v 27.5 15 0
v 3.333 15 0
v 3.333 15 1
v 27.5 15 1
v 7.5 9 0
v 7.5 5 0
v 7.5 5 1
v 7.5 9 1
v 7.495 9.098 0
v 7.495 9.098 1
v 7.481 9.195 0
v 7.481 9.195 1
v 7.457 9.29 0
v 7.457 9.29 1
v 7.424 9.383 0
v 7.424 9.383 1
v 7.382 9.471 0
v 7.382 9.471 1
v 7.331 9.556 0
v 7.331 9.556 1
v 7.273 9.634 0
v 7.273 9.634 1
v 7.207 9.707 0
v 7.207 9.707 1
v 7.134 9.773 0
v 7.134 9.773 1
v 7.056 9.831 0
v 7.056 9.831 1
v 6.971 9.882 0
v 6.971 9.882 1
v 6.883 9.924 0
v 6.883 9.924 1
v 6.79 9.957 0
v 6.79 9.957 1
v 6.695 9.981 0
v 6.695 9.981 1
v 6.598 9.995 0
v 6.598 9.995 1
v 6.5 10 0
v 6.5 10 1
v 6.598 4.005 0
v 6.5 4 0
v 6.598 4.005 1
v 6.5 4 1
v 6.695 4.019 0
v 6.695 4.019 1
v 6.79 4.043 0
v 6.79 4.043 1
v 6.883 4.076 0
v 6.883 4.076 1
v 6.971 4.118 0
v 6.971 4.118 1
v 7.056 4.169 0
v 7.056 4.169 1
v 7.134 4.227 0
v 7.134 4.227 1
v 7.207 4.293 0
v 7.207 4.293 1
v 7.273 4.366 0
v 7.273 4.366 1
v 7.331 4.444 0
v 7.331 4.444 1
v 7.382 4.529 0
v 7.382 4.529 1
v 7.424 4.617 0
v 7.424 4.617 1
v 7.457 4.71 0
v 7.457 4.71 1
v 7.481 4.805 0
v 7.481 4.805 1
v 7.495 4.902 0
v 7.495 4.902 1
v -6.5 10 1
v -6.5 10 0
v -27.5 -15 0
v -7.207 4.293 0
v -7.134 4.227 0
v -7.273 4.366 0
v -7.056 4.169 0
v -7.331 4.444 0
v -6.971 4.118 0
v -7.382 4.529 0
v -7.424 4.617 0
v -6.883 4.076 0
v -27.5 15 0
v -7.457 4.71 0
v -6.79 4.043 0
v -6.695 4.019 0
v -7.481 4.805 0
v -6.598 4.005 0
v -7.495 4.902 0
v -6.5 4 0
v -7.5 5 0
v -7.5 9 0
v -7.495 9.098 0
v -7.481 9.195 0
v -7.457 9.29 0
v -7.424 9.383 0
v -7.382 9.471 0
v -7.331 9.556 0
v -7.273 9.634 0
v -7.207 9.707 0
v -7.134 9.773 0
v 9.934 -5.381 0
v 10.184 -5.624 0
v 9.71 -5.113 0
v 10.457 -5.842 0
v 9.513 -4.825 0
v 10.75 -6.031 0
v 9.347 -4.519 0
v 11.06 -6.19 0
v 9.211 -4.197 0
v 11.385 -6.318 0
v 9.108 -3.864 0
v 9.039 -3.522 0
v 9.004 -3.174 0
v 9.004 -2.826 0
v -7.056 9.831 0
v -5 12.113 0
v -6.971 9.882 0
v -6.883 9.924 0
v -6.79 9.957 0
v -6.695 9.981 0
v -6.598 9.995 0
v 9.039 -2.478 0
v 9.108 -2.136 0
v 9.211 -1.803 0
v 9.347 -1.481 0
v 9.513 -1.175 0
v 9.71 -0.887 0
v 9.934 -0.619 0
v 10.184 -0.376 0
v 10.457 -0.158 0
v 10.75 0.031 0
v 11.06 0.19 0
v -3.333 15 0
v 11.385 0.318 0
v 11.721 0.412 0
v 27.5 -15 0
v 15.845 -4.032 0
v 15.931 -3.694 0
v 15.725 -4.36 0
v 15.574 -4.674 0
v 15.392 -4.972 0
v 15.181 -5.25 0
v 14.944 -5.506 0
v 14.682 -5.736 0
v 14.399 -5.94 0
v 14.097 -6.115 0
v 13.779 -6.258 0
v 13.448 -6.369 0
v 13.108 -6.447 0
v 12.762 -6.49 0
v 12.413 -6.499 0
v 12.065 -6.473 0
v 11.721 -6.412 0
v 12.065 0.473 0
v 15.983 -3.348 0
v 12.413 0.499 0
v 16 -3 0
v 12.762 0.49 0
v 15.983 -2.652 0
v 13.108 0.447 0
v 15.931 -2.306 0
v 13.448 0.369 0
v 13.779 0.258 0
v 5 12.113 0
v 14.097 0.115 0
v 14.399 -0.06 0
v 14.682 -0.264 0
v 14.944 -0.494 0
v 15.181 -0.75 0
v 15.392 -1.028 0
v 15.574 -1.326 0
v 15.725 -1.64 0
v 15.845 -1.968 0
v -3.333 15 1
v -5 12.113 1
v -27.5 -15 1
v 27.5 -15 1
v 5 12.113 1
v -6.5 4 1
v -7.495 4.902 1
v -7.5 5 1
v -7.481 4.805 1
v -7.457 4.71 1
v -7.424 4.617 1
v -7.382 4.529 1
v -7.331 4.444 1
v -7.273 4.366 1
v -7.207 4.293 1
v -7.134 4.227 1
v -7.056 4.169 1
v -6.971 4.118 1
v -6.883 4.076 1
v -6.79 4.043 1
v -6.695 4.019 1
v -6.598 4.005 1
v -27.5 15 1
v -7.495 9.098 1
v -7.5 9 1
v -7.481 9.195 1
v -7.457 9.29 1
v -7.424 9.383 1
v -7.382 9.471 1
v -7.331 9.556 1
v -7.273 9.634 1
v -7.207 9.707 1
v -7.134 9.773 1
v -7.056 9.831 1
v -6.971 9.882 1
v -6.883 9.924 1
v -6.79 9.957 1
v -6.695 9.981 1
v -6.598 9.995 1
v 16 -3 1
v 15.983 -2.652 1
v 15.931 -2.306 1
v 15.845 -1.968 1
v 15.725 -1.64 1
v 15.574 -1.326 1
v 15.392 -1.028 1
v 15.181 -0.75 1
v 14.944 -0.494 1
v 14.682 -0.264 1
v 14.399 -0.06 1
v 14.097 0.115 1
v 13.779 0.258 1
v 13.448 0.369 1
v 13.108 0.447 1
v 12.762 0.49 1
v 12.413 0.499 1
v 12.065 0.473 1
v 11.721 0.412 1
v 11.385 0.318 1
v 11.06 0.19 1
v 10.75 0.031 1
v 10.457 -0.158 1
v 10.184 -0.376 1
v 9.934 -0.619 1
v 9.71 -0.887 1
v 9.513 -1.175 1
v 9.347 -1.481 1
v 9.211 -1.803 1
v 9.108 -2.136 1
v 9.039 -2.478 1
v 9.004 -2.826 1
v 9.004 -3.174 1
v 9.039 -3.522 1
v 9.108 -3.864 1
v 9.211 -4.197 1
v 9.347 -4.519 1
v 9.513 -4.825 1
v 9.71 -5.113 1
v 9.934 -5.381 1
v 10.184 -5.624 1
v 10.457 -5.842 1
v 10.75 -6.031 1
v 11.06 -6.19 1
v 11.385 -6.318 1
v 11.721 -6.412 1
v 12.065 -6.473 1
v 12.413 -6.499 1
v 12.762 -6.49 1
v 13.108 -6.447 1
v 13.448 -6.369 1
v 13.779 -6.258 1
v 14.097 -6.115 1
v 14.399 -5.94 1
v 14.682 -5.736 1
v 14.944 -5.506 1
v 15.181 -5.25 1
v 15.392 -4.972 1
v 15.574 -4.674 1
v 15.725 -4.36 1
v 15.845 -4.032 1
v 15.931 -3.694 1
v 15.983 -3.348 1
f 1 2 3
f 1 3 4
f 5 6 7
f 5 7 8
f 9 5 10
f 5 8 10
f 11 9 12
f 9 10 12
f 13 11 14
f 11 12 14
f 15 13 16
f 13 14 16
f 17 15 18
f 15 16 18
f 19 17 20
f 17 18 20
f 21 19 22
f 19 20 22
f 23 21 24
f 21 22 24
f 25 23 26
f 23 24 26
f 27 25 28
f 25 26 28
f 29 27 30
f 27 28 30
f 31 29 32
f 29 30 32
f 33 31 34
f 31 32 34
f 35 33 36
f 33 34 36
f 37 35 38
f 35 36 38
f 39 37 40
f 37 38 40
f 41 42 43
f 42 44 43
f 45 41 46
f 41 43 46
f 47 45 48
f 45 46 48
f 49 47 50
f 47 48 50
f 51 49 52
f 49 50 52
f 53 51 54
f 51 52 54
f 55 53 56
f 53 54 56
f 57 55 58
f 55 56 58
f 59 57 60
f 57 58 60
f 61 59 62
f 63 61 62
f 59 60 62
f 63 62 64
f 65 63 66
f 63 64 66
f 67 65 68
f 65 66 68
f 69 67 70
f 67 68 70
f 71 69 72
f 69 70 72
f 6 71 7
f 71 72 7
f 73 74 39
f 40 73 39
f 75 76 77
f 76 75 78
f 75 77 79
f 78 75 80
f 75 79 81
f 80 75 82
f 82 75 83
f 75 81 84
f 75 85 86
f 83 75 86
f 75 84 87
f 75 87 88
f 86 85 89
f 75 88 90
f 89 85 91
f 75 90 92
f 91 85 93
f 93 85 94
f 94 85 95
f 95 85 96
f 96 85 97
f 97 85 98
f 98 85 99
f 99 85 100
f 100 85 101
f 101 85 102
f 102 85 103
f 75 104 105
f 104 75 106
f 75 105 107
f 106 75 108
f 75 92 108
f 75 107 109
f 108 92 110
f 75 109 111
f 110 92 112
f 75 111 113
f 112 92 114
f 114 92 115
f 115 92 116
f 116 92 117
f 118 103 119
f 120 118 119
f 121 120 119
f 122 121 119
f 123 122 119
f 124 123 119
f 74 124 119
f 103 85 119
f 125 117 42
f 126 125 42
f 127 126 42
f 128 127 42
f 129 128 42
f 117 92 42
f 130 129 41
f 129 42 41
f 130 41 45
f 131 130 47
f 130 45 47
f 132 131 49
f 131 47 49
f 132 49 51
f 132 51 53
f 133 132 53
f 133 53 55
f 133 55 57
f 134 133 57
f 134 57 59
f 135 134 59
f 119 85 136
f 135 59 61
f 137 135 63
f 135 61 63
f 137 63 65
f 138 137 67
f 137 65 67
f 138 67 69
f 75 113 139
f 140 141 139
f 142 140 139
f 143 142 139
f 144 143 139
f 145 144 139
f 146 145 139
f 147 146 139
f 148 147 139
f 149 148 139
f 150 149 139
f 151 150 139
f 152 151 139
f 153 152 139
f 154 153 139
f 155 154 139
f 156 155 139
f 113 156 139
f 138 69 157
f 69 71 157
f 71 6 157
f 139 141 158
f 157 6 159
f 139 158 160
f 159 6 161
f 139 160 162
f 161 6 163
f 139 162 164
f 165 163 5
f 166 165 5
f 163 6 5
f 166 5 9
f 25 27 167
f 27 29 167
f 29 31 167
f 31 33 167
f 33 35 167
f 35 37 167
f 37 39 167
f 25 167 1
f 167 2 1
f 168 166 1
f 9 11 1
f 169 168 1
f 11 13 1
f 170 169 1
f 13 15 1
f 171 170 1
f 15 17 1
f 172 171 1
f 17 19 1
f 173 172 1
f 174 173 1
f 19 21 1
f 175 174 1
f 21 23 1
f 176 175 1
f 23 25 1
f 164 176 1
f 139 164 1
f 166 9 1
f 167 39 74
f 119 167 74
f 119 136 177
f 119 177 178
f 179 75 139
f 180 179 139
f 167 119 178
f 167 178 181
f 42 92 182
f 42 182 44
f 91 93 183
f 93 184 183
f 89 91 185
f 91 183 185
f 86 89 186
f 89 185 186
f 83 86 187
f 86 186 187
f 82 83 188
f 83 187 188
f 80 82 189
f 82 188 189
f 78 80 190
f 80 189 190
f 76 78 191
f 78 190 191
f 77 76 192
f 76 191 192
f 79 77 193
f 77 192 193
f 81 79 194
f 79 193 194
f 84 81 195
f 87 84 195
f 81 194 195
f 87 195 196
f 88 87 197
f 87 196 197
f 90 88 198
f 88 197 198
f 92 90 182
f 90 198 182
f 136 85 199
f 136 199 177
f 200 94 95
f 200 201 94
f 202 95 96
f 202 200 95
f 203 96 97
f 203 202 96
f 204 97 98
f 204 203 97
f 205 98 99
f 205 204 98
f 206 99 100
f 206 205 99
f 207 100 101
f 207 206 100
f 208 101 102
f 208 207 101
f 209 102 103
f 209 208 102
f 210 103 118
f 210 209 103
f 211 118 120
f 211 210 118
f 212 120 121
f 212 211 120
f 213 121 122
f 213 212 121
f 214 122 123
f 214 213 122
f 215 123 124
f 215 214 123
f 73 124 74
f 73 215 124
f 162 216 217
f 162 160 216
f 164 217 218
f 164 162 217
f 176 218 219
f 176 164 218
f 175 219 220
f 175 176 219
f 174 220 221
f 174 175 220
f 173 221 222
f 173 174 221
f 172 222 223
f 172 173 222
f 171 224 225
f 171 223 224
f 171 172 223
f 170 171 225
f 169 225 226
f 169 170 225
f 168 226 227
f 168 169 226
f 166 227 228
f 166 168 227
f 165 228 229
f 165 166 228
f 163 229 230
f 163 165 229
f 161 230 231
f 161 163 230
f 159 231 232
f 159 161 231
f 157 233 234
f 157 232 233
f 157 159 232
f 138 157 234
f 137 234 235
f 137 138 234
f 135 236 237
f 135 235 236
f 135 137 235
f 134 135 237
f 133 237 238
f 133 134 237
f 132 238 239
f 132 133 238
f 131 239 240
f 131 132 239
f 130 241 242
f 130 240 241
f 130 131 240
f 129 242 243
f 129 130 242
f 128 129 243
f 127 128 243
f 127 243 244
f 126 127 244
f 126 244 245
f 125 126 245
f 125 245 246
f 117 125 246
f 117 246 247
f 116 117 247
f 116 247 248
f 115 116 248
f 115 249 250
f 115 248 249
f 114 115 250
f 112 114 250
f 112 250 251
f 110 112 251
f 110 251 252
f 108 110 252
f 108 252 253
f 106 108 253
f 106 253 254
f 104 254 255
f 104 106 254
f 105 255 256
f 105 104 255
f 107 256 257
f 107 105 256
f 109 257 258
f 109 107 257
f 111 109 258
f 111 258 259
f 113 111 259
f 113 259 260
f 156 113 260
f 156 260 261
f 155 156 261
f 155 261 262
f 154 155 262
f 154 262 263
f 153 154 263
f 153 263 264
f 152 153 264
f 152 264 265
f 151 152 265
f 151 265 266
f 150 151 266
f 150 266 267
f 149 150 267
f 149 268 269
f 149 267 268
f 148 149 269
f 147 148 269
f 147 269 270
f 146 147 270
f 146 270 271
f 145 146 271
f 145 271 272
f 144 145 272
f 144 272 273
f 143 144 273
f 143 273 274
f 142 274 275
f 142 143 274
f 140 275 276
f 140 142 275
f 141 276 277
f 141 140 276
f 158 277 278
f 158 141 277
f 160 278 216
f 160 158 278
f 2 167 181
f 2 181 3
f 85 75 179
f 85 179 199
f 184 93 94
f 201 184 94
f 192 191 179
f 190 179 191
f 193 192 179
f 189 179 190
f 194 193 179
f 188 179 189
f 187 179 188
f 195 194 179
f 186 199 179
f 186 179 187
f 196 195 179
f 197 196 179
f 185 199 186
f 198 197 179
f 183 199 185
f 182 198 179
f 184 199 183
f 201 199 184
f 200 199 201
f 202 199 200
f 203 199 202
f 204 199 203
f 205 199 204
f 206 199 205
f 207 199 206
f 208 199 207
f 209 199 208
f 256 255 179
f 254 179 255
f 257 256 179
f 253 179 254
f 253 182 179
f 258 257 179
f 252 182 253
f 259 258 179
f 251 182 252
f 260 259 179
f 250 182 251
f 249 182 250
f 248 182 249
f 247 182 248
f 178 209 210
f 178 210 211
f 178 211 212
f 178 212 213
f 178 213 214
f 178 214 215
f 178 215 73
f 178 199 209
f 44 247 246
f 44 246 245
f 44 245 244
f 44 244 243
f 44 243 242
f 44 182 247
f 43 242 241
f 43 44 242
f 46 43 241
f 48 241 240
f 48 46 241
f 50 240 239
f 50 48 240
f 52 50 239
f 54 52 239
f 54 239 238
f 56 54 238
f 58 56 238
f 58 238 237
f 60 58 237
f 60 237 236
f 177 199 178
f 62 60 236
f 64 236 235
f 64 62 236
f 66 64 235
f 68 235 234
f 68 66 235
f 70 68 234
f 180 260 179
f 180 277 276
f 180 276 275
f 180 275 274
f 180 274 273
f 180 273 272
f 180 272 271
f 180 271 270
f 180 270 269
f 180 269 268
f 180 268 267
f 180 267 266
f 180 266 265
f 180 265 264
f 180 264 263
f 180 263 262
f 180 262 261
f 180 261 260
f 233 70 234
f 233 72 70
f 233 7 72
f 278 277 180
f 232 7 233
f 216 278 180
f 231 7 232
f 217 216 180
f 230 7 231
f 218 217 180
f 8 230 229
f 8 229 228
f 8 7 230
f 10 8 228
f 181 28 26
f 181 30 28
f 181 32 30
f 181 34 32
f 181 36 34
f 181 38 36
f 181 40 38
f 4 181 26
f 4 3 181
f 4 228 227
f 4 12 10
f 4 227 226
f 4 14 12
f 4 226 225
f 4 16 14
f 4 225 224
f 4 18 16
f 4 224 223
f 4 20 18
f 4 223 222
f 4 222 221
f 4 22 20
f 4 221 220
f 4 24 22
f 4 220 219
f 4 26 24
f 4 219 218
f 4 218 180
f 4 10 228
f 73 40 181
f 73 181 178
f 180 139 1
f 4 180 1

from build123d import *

# Parameters (mm, degrees)
SKETCH1_W               = 55
SKETCH1_H               = 30
BOSS_EXTRUDE1_DEPTH     = 1
CUT_EXTRUDE1_DEPTH      = 32.340867888
CUT_EXTRUDE1_DEPTH_BACK = 32.340867888
SKETCH2_R               = 3.5
SKETCH2_W               = 15
SKETCH2_H               = 6
FILLET1_R               = 1


with BuildPart() as part:
    # Sketch1 → Boss-Extrude1 (new body)
    with BuildSketch(Plane.XY):
        Rectangle(SKETCH1_W, SKETCH1_H)
    extrude(amount=BOSS_EXTRUDE1_DEPTH)

    # Sketch2 → Cut-Extrude1 (cut, two sides: drawn at the far end of the back side and taken through both)
    with BuildSketch(Plane.XY.offset(1).offset(-CUT_EXTRUDE1_DEPTH_BACK)):
        with Locations((12.5, -3)):
            Circle(SKETCH2_R)
        with Locations((0, 7)):
            Rectangle(SKETCH2_W, SKETCH2_H)
        Polygon((0, 20.773502692), (-5, 12.113248654), (5, 12.113248654), align=None)
    extrude(amount=CUT_EXTRUDE1_DEPTH + CUT_EXTRUDE1_DEPTH_BACK, mode=Mode.SUBTRACT)

    # Fillet1
    fillet1_edges = [part.edges().sort_by_distance(p)[0] for p in [
        (-7.5, 4, 0.5),
        (-7.5, 10, 0.5),
        (7.5, 10, 0.5),
        (7.5, 4, 0.5),
    ]]
    fillet(fillet1_edges, radius=FILLET1_R)


solid = part.part
